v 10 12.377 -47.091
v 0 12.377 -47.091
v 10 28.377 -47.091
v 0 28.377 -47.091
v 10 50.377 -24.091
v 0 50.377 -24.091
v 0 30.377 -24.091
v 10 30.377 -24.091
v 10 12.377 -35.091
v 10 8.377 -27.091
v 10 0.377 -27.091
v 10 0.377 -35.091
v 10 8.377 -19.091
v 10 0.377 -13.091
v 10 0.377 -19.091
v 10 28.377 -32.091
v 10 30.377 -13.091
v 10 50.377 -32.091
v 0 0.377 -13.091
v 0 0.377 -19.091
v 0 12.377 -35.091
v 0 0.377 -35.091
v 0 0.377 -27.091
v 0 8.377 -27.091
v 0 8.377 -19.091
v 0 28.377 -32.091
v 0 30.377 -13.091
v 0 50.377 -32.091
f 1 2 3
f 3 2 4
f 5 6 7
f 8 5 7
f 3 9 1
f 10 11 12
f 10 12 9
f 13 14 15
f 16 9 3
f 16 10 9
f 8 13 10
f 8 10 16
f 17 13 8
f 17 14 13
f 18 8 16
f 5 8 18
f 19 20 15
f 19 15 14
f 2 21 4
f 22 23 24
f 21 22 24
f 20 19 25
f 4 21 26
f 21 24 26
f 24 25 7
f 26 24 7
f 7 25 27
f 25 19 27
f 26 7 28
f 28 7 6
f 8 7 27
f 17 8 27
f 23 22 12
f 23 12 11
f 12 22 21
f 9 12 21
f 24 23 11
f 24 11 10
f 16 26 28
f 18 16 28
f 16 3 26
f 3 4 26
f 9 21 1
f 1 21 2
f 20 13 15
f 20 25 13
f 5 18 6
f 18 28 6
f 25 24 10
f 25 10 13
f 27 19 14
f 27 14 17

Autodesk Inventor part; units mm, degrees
ref_plane "YZ Plane" through (0, 0, 0) normal (1, 0, 0) x (0, 1, 0)
ref_plane "XZ Plane" through (0, 0, 0) normal (0, 1, 0) x (-1, 0, 0)
ref_plane "XY Plane" through (0, 0, 0) normal (0, 0, 1) x (1, 0, 0)
sketch "Эскиз1" plane through (0, 0, 0) normal (1, 0, 0) x (0, 1, 0)
  line L0 (0.3766, -35.0912) -> (12.3766, -35.0912)
  line L1 (12.3766, -35.0912) -> (12.3766, -47.0912)
  line L2 (12.3766, -47.0912) -> (28.3766, -47.0912)
  line L3 (28.3766, -32.0912) -> (50.3766, -32.0912)
  line L4 (50.3766, -32.0912) -> (50.3766, -24.0912)
  line L5 (50.3766, -24.0912) -> (30.3766, -24.0912)
  line L6 (30.3766, -24.0912) -> (30.3766, -13.0912)
  line L7 (28.3766, -47.0912) -> (28.3766, -32.0912)
  line L8 (0.3766, -35.0912) -> (0.3766, -27.0912)
  line L9 (0.3766, -27.0912) -> (8.3766, -27.0912)
  line L10 (8.3766, -27.0912) -> (8.3766, -19.0912)
  line L11 (8.3766, -19.0912) -> (0.3766, -19.0912)
  line L12 (0.3766, -19.0912) -> (0.3766, -13.0912)
  line L13 (0.3766, -13.0912) -> (30.3766, -13.0912)
  point P0 (0, 0)
  point P1 (-47.0655, -24.8908)
extrude "Выдавливание1" add sketch "Эскиз1" along normal blind 10
equation "\"Радиус_гибки\" = Толщина"
equation "\"Ширина_просечки\" = Толщина"
equation "\"Глубина_просечки\" = 0.5 * Толщина"
equation "\"Размер_просечки\" = 4 * Толщина"
equation "\"Мин_остаток\" = 2 * Толщина"
equation "\"Радиус_перехода\" = Радиус_гибки"
equation "\"Радиус_Якоби\" = Радиус_гибки"
equation "\"Размер_зазора\" = Толщина"
equation "\"Толщина\" = 0.5"
